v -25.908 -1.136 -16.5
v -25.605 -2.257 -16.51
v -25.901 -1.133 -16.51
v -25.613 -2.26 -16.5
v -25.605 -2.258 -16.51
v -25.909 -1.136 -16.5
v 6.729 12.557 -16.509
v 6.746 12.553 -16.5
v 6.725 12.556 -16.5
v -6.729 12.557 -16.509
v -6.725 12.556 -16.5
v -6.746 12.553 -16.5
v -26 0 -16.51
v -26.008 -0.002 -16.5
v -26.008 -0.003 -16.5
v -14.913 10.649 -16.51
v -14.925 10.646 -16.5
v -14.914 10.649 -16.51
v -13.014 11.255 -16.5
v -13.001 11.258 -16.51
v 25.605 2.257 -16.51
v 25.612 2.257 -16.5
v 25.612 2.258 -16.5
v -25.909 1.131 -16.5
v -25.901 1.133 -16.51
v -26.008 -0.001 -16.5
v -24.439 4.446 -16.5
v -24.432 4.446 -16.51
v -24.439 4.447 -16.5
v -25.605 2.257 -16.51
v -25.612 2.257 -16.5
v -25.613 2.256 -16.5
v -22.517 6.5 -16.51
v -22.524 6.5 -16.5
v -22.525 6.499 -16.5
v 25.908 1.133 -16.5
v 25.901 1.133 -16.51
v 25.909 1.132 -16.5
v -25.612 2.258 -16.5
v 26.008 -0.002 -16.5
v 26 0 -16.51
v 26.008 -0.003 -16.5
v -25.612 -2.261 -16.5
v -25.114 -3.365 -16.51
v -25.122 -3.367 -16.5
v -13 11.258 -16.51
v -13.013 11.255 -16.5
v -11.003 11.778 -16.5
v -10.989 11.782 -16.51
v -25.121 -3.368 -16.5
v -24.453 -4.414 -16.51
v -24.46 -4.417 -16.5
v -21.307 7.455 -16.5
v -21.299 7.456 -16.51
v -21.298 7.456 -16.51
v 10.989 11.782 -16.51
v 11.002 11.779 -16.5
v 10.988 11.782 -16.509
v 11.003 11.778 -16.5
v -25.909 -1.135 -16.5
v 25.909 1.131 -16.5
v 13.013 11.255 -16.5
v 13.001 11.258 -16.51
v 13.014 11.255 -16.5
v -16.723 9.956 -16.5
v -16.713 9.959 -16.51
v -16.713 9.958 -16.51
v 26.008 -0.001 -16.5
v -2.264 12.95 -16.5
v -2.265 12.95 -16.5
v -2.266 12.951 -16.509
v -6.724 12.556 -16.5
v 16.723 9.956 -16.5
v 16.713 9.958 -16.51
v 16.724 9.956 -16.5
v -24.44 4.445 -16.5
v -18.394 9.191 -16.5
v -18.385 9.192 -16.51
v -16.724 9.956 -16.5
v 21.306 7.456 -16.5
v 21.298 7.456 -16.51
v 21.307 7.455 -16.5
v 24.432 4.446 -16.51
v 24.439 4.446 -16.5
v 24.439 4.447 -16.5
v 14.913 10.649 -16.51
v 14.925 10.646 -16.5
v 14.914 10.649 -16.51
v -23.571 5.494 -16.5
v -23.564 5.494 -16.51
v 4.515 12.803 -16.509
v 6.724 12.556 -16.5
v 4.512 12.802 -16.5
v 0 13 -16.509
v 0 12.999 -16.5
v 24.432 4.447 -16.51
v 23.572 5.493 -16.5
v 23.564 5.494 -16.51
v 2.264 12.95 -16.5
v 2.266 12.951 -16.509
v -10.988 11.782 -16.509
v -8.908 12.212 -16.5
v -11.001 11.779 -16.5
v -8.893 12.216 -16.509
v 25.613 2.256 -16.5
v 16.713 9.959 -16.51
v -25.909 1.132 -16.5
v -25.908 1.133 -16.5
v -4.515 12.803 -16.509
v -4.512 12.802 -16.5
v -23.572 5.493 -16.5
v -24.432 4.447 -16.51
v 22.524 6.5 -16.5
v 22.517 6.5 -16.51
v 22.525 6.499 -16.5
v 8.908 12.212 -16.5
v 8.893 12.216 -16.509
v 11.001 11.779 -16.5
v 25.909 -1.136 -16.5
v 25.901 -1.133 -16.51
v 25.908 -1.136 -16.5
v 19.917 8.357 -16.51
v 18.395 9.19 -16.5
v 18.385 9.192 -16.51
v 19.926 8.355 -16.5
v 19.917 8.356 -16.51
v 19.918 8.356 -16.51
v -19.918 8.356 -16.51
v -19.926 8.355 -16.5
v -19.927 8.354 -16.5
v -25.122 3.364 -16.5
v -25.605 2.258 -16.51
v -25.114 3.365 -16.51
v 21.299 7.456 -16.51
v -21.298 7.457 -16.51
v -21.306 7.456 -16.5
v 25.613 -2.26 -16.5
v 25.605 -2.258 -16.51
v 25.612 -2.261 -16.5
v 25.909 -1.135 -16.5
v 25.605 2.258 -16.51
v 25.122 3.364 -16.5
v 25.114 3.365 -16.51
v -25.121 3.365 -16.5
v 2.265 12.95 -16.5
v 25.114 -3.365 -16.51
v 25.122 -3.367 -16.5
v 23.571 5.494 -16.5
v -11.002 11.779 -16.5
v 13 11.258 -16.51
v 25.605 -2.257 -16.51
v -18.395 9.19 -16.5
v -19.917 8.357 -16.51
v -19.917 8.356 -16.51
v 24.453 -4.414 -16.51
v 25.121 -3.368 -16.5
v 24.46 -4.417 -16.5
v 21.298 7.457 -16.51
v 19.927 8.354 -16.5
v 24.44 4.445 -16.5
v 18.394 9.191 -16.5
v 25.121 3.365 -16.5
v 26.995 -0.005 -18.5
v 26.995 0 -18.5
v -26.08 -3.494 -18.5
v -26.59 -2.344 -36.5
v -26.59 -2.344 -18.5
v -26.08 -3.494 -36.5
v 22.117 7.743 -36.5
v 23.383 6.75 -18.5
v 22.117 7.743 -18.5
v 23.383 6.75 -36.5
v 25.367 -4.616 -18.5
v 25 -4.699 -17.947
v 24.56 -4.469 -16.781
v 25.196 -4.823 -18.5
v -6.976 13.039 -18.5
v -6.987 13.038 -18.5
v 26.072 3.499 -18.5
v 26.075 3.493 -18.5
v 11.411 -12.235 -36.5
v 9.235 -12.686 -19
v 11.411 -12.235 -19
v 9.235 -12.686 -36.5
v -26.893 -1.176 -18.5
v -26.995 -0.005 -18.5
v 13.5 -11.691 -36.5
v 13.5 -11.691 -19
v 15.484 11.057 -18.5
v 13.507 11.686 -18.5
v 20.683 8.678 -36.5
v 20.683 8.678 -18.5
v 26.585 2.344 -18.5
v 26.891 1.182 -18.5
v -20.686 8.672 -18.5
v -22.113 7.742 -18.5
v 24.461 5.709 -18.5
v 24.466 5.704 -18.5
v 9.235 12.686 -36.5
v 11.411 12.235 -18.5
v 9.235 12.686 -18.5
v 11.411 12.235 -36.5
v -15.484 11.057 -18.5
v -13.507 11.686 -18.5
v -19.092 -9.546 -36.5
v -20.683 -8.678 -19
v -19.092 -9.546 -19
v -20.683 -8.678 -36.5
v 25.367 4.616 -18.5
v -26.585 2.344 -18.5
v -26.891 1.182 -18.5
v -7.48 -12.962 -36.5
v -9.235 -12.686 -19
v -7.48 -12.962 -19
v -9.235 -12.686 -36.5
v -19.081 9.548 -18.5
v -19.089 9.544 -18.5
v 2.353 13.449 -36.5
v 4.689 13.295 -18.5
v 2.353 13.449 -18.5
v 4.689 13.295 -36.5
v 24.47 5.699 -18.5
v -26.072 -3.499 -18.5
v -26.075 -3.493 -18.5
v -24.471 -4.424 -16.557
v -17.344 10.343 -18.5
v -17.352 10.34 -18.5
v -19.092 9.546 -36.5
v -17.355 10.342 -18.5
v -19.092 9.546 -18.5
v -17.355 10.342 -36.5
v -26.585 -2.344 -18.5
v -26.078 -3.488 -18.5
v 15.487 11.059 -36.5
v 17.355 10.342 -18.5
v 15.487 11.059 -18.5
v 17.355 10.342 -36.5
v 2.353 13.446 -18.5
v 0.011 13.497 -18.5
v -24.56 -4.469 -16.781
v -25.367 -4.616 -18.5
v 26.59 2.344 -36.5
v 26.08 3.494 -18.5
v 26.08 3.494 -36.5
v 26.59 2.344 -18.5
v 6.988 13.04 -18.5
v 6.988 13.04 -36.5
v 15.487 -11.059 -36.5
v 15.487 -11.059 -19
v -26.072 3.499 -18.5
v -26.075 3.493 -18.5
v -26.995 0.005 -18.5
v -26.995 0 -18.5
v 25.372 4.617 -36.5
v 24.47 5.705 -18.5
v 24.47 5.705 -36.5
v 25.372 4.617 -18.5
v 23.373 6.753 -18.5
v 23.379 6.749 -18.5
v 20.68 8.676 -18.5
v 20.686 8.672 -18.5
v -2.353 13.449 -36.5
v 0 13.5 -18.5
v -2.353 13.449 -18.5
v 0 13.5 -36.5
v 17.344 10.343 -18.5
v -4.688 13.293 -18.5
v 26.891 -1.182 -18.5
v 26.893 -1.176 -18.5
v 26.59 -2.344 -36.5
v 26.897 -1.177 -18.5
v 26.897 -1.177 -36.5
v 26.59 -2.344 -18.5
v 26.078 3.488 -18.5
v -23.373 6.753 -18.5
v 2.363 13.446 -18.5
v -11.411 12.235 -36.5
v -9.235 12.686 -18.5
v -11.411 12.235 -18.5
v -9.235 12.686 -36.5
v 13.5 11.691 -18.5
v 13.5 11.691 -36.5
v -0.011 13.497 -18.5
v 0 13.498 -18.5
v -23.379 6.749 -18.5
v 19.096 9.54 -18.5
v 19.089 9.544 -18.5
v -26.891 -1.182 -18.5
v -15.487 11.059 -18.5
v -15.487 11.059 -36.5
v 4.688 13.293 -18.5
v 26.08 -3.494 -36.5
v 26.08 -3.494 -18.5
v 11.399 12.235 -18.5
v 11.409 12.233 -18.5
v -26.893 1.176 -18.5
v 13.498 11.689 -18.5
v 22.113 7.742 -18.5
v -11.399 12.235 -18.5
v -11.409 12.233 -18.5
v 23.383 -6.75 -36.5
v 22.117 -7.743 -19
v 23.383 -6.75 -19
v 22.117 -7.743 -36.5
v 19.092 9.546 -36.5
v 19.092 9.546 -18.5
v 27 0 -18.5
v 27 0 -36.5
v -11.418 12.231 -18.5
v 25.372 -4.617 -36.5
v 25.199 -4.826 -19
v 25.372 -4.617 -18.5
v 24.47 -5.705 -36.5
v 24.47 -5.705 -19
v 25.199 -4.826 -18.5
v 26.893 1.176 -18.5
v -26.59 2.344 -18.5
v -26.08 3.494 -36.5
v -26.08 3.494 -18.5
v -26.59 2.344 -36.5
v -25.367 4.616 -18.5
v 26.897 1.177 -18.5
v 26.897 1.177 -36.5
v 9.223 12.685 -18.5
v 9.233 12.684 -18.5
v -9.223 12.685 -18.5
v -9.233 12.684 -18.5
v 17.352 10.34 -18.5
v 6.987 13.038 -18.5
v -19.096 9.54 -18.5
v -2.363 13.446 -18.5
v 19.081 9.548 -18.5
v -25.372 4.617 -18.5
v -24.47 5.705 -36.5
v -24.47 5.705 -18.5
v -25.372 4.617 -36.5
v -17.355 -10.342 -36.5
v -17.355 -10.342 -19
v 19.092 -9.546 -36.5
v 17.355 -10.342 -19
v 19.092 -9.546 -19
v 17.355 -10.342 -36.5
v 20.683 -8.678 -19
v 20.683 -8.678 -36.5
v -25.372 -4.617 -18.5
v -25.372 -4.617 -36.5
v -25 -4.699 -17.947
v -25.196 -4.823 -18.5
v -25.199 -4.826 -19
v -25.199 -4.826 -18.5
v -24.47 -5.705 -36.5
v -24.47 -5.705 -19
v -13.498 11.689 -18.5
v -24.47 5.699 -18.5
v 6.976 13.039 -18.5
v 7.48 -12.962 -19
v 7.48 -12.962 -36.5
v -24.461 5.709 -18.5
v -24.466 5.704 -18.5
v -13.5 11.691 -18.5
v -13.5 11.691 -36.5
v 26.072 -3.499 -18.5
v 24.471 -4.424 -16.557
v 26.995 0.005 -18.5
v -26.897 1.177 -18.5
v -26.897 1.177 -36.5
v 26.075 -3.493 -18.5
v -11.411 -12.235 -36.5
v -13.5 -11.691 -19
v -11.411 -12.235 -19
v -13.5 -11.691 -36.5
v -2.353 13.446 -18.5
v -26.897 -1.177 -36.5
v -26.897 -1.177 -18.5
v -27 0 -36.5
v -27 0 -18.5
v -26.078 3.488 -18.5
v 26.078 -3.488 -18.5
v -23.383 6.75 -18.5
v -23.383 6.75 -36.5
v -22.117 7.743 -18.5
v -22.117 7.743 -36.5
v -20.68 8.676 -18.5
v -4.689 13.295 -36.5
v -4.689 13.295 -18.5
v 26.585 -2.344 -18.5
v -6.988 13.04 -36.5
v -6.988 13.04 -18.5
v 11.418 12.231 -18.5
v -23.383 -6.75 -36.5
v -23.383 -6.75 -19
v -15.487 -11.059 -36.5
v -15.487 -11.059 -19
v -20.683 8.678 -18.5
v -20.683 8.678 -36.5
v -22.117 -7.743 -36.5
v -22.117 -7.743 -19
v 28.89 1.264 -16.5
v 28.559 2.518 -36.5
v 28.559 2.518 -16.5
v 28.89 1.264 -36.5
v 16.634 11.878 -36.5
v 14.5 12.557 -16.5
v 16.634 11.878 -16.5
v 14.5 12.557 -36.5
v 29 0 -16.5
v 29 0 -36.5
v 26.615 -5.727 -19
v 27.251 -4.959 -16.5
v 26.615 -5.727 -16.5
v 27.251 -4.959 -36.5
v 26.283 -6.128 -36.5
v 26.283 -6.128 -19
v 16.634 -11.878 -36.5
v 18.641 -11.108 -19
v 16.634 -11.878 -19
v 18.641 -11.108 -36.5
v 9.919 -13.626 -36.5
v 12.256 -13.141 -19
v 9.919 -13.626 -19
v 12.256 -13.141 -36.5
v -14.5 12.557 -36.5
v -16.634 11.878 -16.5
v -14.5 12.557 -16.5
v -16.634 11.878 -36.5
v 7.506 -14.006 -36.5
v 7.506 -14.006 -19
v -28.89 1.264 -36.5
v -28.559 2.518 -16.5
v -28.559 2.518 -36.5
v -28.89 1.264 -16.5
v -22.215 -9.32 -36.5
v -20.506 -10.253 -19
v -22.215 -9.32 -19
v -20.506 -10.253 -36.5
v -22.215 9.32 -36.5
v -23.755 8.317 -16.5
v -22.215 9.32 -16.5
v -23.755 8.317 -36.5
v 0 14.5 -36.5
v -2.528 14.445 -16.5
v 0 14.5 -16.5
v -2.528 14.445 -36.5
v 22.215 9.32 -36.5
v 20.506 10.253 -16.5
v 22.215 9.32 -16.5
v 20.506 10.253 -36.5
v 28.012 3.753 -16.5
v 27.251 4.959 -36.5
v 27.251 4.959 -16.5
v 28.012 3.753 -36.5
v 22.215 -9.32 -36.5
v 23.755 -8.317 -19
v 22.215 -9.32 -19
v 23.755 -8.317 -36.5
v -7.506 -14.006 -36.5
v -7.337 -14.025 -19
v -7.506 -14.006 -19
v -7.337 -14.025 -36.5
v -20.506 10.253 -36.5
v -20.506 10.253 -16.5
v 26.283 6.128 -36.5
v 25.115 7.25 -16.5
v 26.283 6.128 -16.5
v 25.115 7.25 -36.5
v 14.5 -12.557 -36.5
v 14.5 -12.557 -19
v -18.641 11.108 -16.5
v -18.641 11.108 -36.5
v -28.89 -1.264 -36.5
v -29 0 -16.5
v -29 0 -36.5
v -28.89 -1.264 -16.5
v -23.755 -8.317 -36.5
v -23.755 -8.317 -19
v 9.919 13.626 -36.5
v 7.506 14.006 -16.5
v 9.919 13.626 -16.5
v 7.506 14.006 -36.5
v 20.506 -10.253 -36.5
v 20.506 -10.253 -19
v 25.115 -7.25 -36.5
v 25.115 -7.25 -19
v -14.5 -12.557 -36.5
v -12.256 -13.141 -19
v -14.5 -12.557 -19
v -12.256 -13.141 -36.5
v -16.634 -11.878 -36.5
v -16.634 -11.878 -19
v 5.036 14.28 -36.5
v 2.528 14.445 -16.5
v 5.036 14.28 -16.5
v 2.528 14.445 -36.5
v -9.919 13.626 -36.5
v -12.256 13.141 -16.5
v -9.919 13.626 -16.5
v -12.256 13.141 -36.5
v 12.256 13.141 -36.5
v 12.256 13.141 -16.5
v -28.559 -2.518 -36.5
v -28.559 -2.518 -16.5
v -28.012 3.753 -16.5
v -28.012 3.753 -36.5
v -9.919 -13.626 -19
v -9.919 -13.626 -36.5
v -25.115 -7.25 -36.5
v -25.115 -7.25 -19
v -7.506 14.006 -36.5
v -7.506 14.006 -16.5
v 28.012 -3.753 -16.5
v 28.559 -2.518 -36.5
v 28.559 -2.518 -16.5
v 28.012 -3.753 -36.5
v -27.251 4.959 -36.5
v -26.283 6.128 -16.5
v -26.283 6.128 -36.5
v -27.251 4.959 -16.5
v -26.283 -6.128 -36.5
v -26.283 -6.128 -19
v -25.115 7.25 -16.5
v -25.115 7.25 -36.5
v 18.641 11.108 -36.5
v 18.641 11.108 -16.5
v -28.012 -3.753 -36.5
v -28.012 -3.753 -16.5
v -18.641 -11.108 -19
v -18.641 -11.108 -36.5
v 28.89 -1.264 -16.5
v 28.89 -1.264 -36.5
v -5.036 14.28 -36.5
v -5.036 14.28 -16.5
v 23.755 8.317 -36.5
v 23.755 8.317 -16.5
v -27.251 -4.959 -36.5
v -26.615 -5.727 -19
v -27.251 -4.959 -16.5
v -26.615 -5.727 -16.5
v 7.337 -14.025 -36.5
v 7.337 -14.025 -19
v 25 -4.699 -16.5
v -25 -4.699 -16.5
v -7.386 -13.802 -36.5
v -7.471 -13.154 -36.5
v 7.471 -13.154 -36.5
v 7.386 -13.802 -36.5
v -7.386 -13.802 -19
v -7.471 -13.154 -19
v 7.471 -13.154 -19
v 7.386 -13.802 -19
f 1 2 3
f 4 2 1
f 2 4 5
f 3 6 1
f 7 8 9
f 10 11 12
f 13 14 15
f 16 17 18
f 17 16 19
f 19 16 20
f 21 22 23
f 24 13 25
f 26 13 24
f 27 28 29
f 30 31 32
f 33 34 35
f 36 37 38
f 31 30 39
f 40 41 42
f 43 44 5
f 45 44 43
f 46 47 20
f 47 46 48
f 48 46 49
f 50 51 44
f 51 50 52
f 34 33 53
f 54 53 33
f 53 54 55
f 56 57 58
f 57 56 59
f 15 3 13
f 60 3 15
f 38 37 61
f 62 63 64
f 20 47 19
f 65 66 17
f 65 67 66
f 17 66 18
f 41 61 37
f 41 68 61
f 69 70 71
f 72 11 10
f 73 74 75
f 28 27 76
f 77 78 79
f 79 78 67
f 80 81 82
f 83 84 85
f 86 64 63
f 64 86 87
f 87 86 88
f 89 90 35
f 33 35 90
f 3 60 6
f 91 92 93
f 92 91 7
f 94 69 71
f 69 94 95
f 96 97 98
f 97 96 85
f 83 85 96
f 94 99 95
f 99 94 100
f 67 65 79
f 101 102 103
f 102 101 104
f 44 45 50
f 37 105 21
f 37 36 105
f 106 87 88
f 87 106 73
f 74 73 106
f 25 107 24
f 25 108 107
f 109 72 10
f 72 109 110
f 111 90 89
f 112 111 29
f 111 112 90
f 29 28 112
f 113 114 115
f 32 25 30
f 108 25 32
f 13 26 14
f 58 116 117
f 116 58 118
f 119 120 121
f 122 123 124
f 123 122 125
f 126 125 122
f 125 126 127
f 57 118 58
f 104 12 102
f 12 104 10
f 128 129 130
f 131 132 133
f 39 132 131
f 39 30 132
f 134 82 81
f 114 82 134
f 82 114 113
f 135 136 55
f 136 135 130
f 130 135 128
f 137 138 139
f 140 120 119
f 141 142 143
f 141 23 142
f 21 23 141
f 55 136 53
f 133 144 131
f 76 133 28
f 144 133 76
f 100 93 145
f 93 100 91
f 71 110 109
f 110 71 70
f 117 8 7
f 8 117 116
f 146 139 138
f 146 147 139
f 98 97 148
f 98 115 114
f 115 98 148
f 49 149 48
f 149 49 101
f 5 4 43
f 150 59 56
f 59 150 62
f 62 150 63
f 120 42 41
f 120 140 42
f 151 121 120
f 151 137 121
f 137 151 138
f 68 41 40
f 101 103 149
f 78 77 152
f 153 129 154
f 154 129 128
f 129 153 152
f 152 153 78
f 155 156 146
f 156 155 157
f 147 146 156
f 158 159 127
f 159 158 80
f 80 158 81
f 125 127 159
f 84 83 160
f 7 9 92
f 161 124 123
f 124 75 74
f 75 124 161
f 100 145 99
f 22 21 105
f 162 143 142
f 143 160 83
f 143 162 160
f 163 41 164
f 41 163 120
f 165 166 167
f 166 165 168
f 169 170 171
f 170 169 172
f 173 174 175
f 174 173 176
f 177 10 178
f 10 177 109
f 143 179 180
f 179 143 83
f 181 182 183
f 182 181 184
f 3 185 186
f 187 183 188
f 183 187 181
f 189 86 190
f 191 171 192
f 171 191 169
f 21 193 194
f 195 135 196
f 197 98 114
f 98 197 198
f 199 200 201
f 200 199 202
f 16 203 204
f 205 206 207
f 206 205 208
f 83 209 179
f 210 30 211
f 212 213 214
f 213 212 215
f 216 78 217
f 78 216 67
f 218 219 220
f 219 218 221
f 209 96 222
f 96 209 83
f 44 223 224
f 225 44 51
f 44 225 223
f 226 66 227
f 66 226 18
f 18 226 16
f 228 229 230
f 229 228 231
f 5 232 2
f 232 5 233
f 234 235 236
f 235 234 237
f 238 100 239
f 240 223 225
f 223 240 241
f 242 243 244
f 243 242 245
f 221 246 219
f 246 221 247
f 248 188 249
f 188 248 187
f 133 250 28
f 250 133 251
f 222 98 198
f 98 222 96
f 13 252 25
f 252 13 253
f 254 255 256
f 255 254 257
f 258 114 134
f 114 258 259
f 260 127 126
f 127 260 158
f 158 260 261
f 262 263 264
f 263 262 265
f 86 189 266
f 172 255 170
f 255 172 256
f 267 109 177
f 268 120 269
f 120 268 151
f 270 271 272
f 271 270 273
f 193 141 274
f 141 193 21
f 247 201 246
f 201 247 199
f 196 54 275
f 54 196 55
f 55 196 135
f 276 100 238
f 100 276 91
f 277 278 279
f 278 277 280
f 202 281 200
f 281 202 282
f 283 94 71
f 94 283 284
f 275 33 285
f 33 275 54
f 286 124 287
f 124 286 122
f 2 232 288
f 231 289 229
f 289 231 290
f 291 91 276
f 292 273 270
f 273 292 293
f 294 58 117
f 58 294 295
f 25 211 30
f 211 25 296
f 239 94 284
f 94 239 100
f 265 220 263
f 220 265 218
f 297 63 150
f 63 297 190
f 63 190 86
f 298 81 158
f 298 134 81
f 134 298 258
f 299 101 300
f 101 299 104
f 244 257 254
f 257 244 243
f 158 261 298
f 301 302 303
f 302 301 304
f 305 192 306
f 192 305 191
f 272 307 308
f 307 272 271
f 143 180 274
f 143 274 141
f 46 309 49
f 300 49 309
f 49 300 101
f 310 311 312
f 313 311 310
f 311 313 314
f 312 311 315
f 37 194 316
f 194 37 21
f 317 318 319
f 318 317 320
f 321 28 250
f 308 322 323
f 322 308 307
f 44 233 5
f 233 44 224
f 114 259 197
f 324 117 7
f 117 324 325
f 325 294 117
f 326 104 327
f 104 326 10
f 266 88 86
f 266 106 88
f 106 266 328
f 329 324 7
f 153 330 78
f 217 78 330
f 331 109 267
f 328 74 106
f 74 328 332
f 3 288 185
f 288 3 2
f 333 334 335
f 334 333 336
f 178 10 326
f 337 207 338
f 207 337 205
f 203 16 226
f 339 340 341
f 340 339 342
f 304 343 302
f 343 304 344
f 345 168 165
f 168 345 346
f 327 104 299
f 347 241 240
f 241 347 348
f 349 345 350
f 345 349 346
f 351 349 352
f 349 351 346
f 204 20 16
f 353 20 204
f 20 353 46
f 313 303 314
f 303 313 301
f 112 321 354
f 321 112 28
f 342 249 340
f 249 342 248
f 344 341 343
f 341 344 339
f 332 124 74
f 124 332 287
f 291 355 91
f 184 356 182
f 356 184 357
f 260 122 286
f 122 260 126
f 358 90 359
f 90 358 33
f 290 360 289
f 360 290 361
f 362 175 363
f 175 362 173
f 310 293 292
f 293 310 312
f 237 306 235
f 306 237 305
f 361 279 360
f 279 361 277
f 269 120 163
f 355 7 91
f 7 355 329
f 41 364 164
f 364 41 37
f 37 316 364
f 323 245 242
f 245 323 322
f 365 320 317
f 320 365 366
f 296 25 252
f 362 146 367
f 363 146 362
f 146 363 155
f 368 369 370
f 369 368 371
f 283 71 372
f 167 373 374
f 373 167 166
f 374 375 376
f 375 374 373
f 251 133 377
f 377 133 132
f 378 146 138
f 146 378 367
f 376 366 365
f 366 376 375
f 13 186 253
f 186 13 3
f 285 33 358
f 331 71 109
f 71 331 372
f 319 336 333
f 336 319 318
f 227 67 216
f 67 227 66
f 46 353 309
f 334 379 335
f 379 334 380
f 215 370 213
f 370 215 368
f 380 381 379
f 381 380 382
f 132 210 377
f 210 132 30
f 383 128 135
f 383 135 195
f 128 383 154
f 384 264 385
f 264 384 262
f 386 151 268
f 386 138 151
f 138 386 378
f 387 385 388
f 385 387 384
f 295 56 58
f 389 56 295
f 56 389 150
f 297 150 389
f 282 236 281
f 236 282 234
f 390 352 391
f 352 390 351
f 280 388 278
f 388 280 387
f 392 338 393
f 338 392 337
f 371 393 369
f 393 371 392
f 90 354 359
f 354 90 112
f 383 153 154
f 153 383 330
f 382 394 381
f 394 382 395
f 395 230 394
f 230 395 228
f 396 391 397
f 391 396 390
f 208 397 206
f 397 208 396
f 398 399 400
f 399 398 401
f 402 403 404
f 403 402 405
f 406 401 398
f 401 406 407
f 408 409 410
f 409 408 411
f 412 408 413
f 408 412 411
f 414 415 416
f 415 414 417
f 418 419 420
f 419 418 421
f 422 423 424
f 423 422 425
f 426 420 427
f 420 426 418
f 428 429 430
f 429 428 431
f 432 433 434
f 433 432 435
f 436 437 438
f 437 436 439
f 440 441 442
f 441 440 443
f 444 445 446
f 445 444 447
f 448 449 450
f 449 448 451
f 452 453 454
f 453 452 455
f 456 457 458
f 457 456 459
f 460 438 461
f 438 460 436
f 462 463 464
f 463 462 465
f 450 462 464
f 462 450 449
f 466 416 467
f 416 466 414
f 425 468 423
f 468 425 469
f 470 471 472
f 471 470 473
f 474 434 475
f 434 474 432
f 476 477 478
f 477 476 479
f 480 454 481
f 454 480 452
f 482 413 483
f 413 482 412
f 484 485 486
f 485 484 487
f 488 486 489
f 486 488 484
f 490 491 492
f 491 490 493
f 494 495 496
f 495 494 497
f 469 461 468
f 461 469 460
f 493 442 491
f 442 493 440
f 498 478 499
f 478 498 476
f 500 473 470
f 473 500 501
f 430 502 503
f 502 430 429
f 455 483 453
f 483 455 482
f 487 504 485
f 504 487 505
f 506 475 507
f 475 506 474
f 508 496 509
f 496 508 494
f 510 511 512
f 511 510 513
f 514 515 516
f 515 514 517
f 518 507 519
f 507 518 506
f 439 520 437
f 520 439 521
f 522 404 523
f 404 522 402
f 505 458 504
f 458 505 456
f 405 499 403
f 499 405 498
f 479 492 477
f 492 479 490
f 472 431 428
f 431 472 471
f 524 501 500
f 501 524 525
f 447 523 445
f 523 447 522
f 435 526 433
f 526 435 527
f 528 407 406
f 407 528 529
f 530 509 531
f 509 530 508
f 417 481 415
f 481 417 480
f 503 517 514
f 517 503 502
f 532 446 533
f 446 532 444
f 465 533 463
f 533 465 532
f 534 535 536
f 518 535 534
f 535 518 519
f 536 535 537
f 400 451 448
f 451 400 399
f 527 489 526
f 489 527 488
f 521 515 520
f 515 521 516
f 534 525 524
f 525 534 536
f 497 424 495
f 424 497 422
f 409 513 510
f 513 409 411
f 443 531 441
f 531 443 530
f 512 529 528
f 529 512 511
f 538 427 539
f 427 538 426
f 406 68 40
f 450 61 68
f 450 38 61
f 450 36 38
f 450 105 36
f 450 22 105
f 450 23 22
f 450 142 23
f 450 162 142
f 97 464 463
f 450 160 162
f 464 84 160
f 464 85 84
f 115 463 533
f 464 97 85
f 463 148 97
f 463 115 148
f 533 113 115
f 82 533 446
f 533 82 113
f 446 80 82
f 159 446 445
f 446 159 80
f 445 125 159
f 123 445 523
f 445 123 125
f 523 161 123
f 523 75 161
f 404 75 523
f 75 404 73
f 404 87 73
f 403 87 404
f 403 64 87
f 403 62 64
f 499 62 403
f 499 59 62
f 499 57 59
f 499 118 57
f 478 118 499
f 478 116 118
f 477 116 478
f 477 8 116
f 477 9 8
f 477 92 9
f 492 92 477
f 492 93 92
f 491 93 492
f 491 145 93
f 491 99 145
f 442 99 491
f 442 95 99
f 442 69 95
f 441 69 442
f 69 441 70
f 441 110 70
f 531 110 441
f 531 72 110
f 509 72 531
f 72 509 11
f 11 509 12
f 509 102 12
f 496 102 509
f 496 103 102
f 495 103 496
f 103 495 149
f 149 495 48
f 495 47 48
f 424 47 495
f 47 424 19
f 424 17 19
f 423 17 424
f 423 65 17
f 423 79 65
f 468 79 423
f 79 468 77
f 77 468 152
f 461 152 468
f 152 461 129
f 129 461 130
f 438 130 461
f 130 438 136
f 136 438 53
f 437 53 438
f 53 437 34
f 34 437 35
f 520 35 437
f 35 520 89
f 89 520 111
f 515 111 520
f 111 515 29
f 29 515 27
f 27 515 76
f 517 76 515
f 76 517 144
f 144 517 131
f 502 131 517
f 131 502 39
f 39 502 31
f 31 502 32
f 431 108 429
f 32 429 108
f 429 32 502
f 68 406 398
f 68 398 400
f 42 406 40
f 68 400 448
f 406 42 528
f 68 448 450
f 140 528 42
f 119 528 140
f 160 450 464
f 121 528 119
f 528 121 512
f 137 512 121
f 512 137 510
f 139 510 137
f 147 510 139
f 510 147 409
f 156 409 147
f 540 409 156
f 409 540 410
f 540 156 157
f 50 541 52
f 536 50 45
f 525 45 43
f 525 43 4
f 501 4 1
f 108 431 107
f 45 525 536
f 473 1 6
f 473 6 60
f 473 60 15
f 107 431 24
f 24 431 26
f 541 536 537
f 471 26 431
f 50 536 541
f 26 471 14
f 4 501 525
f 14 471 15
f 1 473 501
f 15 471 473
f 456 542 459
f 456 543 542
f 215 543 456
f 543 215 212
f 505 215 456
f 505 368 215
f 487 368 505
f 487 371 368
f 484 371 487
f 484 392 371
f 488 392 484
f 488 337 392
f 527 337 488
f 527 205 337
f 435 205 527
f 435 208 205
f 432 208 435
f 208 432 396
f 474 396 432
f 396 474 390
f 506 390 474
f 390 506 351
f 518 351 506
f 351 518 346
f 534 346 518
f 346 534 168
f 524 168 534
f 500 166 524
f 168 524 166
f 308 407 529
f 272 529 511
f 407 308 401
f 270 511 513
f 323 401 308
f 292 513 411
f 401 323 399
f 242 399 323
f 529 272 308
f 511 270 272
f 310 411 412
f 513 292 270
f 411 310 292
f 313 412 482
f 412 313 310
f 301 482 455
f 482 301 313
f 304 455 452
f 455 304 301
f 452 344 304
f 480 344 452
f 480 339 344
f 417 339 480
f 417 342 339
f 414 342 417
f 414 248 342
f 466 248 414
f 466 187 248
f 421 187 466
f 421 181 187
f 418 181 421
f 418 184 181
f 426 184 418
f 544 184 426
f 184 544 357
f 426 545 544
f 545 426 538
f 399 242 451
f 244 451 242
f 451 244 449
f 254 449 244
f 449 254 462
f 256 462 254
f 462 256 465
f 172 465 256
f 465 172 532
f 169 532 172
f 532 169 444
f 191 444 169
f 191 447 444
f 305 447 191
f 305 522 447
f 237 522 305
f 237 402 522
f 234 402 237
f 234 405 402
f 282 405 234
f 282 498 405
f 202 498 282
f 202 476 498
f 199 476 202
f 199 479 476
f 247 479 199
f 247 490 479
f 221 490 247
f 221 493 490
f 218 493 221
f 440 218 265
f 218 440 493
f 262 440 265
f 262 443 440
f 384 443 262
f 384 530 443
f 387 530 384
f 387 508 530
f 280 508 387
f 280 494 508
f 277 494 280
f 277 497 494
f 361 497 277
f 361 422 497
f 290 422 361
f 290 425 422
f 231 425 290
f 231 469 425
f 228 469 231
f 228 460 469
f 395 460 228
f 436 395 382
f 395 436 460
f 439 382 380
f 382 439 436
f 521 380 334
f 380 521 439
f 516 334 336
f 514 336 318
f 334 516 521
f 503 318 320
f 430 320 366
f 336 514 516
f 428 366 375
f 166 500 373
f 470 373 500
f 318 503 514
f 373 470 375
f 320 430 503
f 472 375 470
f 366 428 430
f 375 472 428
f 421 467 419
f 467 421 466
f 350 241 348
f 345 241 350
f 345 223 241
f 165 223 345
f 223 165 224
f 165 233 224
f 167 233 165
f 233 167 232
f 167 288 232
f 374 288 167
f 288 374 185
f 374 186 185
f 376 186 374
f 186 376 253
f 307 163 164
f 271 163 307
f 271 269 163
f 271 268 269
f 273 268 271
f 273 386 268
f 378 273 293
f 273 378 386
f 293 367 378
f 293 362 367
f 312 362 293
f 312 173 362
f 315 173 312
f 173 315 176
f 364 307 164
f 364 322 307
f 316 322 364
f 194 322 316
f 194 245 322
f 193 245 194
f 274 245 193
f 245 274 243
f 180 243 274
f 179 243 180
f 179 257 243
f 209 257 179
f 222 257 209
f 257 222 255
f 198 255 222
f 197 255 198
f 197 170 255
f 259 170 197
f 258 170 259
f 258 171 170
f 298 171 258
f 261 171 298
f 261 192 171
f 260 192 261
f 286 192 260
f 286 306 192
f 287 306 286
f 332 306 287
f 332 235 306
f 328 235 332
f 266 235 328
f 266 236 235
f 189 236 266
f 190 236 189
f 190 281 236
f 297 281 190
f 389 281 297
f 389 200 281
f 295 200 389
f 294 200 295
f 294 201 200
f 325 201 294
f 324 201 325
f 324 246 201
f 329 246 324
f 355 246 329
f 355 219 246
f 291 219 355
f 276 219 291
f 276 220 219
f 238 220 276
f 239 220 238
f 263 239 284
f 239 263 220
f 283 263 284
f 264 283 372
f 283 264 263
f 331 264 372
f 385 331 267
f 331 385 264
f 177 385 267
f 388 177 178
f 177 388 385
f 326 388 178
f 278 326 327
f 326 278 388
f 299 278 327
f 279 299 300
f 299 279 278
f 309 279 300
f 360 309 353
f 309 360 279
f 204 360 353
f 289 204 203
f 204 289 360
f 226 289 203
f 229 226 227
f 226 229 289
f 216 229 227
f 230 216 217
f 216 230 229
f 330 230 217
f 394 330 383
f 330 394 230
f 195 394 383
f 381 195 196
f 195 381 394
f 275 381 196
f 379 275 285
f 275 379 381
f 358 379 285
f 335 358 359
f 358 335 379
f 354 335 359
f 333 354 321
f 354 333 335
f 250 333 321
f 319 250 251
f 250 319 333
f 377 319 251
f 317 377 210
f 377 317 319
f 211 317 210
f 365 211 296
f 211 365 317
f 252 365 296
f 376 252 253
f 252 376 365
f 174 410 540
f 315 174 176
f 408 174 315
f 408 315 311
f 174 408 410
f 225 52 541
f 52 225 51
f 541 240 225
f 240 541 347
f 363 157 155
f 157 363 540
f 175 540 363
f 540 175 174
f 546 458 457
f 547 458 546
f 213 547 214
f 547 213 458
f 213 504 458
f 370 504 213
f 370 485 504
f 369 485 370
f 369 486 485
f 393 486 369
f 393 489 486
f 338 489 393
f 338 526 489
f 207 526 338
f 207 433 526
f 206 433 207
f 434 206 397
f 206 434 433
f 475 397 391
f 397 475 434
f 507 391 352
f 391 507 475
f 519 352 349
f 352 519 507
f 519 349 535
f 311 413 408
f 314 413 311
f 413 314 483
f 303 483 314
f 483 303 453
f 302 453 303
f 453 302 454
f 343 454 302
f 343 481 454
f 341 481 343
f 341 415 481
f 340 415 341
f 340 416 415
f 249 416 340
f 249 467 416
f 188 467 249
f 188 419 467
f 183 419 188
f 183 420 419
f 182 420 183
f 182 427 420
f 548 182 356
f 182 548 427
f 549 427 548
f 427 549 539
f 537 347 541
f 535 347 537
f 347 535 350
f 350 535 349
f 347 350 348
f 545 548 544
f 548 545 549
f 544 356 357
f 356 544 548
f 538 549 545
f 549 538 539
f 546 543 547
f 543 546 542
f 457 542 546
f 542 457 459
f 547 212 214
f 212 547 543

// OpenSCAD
// This file is part of Cyclone PCB Factory: an open-source 3D printable CNC machine for PCB manufacture
// http://reprap.org/wiki/Cyclone_PCB_Factory
// Original author: Carlosgs (http://carlosgs.es)
// License: CC BY-SA 4.0 (Attribution-ShareAlike 4.0 International, http://creativecommons.org/licenses/by-sa/4.0/)
// Designed with http://www.openscad.org/

// Increase the resolution of default shapes
$fa = 5; // Minimum angle for fragments [degrees]
$fs = 0.5; // Minimum fragment size [mm]


dremel_accessory_diam = 20;
dremel_accesory_height = 15-2;

screws_vertical_offset = 1;

aspirator_thickness_thick = 2;
aspirator_thickness_slim = 1;
aspirator_thickness_screw = 4;

aspirator_tube_diam = 16+0.5;
aspirator_tube_holder_height = 15;

aspirator_hole_height = 15-5;
aspirator_hole_diam = 35+15;
aspirator_hole_Yscale = 0.5;

edge_height = 2;

dremel_wrench_diam = 0;
dremel_wrench_hole_offset = 8;

dremel_accessory_screw_separation = dremel_accessory_diam+aspirator_thickness_screw+0.8;
dremel_accessory_angle = 0;

dremel_accessory_tube_offset = dremel_accessory_diam-aspirator_tube_diam;
aspirator_tube_separation = dremel_accessory_diam+aspirator_tube_diam+aspirator_thickness_screw*2+1.5;
dremel_accessory_hole_offset = 0;//dremel_accessory_diam-aspirator_hole_diam;

// Useful MCAD functions reference

//use <MCAD/motors.scad>
//stepper_motor_mount(nema_standard=17, slide_distance=10, $fn=40, mochup=true);

//use <MCAD/boxes.scad>
//roundedBox([10,20,30], radius=2, sidesonly=false, $fn=60);

//include <MCAD/stepper.scad>
//motor(Nema17, size=NemaMedium, dualAxis=false);


//use <MCAD/teardrop.scad>
//teardrop(radius=10, length=20, angle=90);

//use <MCAD/nuts_and_bolts.scad>
//nutHole(size=3, tolerance=0.5, proj=-1);
//boltHole(size=3, length=10, tolerance=0.5, proj=-1, $fn=40);

use <MCAD/teardrop.scad>
use <MCAD/nuts_and_bolts.scad>

module aspirator_accessory_2Dshape() {
	hull() {
		translate([aspirator_tube_separation/2,-dremel_accessory_tube_offset/2])
			circle(r=aspirator_thickness_thick+aspirator_tube_diam/2, h=dremel_accesory_height);
		circle(r=aspirator_thickness_thick+dremel_accessory_diam/2, h=dremel_accesory_height);
		translate([-aspirator_tube_separation/2,-dremel_accessory_tube_offset/2])
			circle(r=aspirator_thickness_thick+aspirator_tube_diam/2, h=dremel_accesory_height);
	}
}

module aspirator_accessory_filledshape() {
	linear_extrude(height=dremel_accesory_height,center=true)
		aspirator_accessory_2Dshape();
	hull() {
		translate([0,0,-dremel_accesory_height/2])
			linear_extrude(height=0.001,center=true)
				aspirator_accessory_2Dshape();
		translate([0,dremel_accessory_hole_offset/2,-dremel_accesory_height/2-aspirator_hole_height])
			linear_extrude(height=0.001,center=true)
				scale([1,aspirator_hole_Yscale,1]) circle(r=aspirator_thickness_slim+aspirator_hole_diam/2);
	}
	hull() {
		translate([0,dremel_accessory_hole_offset/2,-dremel_accesory_height/2-aspirator_hole_height])
			linear_extrude(height=0.001,center=true)
				scale([1,aspirator_hole_Yscale,1]) circle(r=aspirator_thickness_slim+aspirator_hole_diam/2);
		translate([0,dremel_accessory_hole_offset/2,-dremel_accesory_height/2-aspirator_hole_height-edge_height])
			linear_extrude(height=0.001,center=true)
				scale([1,aspirator_hole_Yscale,1]) circle(r=aspirator_thickness_slim+aspirator_hole_diam/2+edge_height/2);
	
	}
}

module aspirator_accessory_2Dholes() {
	translate([aspirator_tube_separation/2,-dremel_accessory_tube_offset/2])
		circle(r=aspirator_tube_diam/2);
	circle(r=dremel_accessory_diam/2);
	translate([-aspirator_tube_separation/2,-dremel_accessory_tube_offset/2])
		circle(r=aspirator_tube_diam/2);
}

module screwHole() {
	translate([0,-7,0])
		rotate([90,0,0])
		hull() {
		translate([0,0,20])
			nutHole(size=3, tolerance=0.5, proj=-1);
		nutHole(size=3, tolerance=0.5, proj=-1);
		}
	translate([0,aspirator_tube_diam/2,0])
		rotate([90,0,0])
			boltHole(size=3, length=30, tolerance=0.4, proj=-1);
}

module aspirator_accessory_holes() {
	linear_extrude(height=dremel_accesory_height+0.01,center=true)
		aspirator_accessory_2Dholes();
	hull() {
		translate([0,0,-dremel_accesory_height/2+0.01])
			linear_extrude(height=0.001,center=true)
				aspirator_accessory_2Dholes();
		translate([0,dremel_accessory_hole_offset/2,-dremel_accesory_height/2-aspirator_hole_height+1-0.01])
			linear_extrude(height=0.001,center=true)
				scale([1,aspirator_hole_Yscale,1]) circle(r=aspirator_hole_diam/2);
	}
	translate([0,dremel_accessory_hole_offset/2,-dremel_accesory_height/2-aspirator_hole_height-1])
			linear_extrude(height=2+edge_height+0.1,center=true)
				scale([1,aspirator_hole_Yscale,1]) circle(r=aspirator_hole_diam/2);
	// Hole for the tightener
	translate([0,-dremel_accessory_tube_offset/4,0])
		cube([aspirator_tube_separation,2.5,dremel_accesory_height+0.01],center=true);
	// Frontal hole for the wrench
	translate([0,(dremel_accessory_diam+aspirator_thickness_thick)/2,-(dremel_accesory_height+aspirator_hole_height)/2-dremel_wrench_hole_offset])
		cube([dremel_wrench_diam,10,aspirator_hole_height+0.01],center=true);
	// Holes for the nut/screws
	#translate([dremel_accessory_screw_separation/2,0,screws_vertical_offset])
		rotate([0,0,-dremel_accessory_angle])
			screwHole();
	#translate([-dremel_accessory_screw_separation/2,0,screws_vertical_offset])
		rotate([0,0,dremel_accessory_angle])
			screwHole();
}



module aspirator_accessory_extender() {
	extender_length = 20;
	extender_thickness = 2;
	difference() {
		translate([0,dremel_accessory_hole_offset/2,-dremel_accesory_height/2-aspirator_hole_height+edge_height-2])
			rotate([180,0,0]) linear_extrude(height=extender_length)
				scale([1,aspirator_hole_Yscale,1]) circle(r=aspirator_hole_diam/2+2+extender_thickness);
		translate([0,dremel_accessory_hole_offset/2,-dremel_accesory_height/2-aspirator_hole_height+edge_height-4])
			rotate([180,0,0]) linear_extrude(height=extender_length+5)
				scale([1,aspirator_hole_Yscale,1]) circle(r=aspirator_hole_diam/2+2);
		translate([0,0,-0.01])
			aspirator_accessory_filledshape();
		translate([0,dremel_accessory_hole_offset/2-48,-dremel_accesory_height/2-aspirator_hole_height+edge_height])
			rotate([180,0,0]) cylinder(r=100/2, h=4.5);
		translate([0,-aspirator_hole_Yscale*aspirator_hole_diam/2,-dremel_accesory_height/2-aspirator_hole_height+edge_height])
			rotate([180,0,0]) cylinder(r=15/2, h=extender_length+5);
	}
}

// Render the dremel part
difference() {
	aspirator_accessory_filledshape();
	aspirator_accessory_holes();
}

// Render the detachable extender
!aspirator_accessory_extender();
